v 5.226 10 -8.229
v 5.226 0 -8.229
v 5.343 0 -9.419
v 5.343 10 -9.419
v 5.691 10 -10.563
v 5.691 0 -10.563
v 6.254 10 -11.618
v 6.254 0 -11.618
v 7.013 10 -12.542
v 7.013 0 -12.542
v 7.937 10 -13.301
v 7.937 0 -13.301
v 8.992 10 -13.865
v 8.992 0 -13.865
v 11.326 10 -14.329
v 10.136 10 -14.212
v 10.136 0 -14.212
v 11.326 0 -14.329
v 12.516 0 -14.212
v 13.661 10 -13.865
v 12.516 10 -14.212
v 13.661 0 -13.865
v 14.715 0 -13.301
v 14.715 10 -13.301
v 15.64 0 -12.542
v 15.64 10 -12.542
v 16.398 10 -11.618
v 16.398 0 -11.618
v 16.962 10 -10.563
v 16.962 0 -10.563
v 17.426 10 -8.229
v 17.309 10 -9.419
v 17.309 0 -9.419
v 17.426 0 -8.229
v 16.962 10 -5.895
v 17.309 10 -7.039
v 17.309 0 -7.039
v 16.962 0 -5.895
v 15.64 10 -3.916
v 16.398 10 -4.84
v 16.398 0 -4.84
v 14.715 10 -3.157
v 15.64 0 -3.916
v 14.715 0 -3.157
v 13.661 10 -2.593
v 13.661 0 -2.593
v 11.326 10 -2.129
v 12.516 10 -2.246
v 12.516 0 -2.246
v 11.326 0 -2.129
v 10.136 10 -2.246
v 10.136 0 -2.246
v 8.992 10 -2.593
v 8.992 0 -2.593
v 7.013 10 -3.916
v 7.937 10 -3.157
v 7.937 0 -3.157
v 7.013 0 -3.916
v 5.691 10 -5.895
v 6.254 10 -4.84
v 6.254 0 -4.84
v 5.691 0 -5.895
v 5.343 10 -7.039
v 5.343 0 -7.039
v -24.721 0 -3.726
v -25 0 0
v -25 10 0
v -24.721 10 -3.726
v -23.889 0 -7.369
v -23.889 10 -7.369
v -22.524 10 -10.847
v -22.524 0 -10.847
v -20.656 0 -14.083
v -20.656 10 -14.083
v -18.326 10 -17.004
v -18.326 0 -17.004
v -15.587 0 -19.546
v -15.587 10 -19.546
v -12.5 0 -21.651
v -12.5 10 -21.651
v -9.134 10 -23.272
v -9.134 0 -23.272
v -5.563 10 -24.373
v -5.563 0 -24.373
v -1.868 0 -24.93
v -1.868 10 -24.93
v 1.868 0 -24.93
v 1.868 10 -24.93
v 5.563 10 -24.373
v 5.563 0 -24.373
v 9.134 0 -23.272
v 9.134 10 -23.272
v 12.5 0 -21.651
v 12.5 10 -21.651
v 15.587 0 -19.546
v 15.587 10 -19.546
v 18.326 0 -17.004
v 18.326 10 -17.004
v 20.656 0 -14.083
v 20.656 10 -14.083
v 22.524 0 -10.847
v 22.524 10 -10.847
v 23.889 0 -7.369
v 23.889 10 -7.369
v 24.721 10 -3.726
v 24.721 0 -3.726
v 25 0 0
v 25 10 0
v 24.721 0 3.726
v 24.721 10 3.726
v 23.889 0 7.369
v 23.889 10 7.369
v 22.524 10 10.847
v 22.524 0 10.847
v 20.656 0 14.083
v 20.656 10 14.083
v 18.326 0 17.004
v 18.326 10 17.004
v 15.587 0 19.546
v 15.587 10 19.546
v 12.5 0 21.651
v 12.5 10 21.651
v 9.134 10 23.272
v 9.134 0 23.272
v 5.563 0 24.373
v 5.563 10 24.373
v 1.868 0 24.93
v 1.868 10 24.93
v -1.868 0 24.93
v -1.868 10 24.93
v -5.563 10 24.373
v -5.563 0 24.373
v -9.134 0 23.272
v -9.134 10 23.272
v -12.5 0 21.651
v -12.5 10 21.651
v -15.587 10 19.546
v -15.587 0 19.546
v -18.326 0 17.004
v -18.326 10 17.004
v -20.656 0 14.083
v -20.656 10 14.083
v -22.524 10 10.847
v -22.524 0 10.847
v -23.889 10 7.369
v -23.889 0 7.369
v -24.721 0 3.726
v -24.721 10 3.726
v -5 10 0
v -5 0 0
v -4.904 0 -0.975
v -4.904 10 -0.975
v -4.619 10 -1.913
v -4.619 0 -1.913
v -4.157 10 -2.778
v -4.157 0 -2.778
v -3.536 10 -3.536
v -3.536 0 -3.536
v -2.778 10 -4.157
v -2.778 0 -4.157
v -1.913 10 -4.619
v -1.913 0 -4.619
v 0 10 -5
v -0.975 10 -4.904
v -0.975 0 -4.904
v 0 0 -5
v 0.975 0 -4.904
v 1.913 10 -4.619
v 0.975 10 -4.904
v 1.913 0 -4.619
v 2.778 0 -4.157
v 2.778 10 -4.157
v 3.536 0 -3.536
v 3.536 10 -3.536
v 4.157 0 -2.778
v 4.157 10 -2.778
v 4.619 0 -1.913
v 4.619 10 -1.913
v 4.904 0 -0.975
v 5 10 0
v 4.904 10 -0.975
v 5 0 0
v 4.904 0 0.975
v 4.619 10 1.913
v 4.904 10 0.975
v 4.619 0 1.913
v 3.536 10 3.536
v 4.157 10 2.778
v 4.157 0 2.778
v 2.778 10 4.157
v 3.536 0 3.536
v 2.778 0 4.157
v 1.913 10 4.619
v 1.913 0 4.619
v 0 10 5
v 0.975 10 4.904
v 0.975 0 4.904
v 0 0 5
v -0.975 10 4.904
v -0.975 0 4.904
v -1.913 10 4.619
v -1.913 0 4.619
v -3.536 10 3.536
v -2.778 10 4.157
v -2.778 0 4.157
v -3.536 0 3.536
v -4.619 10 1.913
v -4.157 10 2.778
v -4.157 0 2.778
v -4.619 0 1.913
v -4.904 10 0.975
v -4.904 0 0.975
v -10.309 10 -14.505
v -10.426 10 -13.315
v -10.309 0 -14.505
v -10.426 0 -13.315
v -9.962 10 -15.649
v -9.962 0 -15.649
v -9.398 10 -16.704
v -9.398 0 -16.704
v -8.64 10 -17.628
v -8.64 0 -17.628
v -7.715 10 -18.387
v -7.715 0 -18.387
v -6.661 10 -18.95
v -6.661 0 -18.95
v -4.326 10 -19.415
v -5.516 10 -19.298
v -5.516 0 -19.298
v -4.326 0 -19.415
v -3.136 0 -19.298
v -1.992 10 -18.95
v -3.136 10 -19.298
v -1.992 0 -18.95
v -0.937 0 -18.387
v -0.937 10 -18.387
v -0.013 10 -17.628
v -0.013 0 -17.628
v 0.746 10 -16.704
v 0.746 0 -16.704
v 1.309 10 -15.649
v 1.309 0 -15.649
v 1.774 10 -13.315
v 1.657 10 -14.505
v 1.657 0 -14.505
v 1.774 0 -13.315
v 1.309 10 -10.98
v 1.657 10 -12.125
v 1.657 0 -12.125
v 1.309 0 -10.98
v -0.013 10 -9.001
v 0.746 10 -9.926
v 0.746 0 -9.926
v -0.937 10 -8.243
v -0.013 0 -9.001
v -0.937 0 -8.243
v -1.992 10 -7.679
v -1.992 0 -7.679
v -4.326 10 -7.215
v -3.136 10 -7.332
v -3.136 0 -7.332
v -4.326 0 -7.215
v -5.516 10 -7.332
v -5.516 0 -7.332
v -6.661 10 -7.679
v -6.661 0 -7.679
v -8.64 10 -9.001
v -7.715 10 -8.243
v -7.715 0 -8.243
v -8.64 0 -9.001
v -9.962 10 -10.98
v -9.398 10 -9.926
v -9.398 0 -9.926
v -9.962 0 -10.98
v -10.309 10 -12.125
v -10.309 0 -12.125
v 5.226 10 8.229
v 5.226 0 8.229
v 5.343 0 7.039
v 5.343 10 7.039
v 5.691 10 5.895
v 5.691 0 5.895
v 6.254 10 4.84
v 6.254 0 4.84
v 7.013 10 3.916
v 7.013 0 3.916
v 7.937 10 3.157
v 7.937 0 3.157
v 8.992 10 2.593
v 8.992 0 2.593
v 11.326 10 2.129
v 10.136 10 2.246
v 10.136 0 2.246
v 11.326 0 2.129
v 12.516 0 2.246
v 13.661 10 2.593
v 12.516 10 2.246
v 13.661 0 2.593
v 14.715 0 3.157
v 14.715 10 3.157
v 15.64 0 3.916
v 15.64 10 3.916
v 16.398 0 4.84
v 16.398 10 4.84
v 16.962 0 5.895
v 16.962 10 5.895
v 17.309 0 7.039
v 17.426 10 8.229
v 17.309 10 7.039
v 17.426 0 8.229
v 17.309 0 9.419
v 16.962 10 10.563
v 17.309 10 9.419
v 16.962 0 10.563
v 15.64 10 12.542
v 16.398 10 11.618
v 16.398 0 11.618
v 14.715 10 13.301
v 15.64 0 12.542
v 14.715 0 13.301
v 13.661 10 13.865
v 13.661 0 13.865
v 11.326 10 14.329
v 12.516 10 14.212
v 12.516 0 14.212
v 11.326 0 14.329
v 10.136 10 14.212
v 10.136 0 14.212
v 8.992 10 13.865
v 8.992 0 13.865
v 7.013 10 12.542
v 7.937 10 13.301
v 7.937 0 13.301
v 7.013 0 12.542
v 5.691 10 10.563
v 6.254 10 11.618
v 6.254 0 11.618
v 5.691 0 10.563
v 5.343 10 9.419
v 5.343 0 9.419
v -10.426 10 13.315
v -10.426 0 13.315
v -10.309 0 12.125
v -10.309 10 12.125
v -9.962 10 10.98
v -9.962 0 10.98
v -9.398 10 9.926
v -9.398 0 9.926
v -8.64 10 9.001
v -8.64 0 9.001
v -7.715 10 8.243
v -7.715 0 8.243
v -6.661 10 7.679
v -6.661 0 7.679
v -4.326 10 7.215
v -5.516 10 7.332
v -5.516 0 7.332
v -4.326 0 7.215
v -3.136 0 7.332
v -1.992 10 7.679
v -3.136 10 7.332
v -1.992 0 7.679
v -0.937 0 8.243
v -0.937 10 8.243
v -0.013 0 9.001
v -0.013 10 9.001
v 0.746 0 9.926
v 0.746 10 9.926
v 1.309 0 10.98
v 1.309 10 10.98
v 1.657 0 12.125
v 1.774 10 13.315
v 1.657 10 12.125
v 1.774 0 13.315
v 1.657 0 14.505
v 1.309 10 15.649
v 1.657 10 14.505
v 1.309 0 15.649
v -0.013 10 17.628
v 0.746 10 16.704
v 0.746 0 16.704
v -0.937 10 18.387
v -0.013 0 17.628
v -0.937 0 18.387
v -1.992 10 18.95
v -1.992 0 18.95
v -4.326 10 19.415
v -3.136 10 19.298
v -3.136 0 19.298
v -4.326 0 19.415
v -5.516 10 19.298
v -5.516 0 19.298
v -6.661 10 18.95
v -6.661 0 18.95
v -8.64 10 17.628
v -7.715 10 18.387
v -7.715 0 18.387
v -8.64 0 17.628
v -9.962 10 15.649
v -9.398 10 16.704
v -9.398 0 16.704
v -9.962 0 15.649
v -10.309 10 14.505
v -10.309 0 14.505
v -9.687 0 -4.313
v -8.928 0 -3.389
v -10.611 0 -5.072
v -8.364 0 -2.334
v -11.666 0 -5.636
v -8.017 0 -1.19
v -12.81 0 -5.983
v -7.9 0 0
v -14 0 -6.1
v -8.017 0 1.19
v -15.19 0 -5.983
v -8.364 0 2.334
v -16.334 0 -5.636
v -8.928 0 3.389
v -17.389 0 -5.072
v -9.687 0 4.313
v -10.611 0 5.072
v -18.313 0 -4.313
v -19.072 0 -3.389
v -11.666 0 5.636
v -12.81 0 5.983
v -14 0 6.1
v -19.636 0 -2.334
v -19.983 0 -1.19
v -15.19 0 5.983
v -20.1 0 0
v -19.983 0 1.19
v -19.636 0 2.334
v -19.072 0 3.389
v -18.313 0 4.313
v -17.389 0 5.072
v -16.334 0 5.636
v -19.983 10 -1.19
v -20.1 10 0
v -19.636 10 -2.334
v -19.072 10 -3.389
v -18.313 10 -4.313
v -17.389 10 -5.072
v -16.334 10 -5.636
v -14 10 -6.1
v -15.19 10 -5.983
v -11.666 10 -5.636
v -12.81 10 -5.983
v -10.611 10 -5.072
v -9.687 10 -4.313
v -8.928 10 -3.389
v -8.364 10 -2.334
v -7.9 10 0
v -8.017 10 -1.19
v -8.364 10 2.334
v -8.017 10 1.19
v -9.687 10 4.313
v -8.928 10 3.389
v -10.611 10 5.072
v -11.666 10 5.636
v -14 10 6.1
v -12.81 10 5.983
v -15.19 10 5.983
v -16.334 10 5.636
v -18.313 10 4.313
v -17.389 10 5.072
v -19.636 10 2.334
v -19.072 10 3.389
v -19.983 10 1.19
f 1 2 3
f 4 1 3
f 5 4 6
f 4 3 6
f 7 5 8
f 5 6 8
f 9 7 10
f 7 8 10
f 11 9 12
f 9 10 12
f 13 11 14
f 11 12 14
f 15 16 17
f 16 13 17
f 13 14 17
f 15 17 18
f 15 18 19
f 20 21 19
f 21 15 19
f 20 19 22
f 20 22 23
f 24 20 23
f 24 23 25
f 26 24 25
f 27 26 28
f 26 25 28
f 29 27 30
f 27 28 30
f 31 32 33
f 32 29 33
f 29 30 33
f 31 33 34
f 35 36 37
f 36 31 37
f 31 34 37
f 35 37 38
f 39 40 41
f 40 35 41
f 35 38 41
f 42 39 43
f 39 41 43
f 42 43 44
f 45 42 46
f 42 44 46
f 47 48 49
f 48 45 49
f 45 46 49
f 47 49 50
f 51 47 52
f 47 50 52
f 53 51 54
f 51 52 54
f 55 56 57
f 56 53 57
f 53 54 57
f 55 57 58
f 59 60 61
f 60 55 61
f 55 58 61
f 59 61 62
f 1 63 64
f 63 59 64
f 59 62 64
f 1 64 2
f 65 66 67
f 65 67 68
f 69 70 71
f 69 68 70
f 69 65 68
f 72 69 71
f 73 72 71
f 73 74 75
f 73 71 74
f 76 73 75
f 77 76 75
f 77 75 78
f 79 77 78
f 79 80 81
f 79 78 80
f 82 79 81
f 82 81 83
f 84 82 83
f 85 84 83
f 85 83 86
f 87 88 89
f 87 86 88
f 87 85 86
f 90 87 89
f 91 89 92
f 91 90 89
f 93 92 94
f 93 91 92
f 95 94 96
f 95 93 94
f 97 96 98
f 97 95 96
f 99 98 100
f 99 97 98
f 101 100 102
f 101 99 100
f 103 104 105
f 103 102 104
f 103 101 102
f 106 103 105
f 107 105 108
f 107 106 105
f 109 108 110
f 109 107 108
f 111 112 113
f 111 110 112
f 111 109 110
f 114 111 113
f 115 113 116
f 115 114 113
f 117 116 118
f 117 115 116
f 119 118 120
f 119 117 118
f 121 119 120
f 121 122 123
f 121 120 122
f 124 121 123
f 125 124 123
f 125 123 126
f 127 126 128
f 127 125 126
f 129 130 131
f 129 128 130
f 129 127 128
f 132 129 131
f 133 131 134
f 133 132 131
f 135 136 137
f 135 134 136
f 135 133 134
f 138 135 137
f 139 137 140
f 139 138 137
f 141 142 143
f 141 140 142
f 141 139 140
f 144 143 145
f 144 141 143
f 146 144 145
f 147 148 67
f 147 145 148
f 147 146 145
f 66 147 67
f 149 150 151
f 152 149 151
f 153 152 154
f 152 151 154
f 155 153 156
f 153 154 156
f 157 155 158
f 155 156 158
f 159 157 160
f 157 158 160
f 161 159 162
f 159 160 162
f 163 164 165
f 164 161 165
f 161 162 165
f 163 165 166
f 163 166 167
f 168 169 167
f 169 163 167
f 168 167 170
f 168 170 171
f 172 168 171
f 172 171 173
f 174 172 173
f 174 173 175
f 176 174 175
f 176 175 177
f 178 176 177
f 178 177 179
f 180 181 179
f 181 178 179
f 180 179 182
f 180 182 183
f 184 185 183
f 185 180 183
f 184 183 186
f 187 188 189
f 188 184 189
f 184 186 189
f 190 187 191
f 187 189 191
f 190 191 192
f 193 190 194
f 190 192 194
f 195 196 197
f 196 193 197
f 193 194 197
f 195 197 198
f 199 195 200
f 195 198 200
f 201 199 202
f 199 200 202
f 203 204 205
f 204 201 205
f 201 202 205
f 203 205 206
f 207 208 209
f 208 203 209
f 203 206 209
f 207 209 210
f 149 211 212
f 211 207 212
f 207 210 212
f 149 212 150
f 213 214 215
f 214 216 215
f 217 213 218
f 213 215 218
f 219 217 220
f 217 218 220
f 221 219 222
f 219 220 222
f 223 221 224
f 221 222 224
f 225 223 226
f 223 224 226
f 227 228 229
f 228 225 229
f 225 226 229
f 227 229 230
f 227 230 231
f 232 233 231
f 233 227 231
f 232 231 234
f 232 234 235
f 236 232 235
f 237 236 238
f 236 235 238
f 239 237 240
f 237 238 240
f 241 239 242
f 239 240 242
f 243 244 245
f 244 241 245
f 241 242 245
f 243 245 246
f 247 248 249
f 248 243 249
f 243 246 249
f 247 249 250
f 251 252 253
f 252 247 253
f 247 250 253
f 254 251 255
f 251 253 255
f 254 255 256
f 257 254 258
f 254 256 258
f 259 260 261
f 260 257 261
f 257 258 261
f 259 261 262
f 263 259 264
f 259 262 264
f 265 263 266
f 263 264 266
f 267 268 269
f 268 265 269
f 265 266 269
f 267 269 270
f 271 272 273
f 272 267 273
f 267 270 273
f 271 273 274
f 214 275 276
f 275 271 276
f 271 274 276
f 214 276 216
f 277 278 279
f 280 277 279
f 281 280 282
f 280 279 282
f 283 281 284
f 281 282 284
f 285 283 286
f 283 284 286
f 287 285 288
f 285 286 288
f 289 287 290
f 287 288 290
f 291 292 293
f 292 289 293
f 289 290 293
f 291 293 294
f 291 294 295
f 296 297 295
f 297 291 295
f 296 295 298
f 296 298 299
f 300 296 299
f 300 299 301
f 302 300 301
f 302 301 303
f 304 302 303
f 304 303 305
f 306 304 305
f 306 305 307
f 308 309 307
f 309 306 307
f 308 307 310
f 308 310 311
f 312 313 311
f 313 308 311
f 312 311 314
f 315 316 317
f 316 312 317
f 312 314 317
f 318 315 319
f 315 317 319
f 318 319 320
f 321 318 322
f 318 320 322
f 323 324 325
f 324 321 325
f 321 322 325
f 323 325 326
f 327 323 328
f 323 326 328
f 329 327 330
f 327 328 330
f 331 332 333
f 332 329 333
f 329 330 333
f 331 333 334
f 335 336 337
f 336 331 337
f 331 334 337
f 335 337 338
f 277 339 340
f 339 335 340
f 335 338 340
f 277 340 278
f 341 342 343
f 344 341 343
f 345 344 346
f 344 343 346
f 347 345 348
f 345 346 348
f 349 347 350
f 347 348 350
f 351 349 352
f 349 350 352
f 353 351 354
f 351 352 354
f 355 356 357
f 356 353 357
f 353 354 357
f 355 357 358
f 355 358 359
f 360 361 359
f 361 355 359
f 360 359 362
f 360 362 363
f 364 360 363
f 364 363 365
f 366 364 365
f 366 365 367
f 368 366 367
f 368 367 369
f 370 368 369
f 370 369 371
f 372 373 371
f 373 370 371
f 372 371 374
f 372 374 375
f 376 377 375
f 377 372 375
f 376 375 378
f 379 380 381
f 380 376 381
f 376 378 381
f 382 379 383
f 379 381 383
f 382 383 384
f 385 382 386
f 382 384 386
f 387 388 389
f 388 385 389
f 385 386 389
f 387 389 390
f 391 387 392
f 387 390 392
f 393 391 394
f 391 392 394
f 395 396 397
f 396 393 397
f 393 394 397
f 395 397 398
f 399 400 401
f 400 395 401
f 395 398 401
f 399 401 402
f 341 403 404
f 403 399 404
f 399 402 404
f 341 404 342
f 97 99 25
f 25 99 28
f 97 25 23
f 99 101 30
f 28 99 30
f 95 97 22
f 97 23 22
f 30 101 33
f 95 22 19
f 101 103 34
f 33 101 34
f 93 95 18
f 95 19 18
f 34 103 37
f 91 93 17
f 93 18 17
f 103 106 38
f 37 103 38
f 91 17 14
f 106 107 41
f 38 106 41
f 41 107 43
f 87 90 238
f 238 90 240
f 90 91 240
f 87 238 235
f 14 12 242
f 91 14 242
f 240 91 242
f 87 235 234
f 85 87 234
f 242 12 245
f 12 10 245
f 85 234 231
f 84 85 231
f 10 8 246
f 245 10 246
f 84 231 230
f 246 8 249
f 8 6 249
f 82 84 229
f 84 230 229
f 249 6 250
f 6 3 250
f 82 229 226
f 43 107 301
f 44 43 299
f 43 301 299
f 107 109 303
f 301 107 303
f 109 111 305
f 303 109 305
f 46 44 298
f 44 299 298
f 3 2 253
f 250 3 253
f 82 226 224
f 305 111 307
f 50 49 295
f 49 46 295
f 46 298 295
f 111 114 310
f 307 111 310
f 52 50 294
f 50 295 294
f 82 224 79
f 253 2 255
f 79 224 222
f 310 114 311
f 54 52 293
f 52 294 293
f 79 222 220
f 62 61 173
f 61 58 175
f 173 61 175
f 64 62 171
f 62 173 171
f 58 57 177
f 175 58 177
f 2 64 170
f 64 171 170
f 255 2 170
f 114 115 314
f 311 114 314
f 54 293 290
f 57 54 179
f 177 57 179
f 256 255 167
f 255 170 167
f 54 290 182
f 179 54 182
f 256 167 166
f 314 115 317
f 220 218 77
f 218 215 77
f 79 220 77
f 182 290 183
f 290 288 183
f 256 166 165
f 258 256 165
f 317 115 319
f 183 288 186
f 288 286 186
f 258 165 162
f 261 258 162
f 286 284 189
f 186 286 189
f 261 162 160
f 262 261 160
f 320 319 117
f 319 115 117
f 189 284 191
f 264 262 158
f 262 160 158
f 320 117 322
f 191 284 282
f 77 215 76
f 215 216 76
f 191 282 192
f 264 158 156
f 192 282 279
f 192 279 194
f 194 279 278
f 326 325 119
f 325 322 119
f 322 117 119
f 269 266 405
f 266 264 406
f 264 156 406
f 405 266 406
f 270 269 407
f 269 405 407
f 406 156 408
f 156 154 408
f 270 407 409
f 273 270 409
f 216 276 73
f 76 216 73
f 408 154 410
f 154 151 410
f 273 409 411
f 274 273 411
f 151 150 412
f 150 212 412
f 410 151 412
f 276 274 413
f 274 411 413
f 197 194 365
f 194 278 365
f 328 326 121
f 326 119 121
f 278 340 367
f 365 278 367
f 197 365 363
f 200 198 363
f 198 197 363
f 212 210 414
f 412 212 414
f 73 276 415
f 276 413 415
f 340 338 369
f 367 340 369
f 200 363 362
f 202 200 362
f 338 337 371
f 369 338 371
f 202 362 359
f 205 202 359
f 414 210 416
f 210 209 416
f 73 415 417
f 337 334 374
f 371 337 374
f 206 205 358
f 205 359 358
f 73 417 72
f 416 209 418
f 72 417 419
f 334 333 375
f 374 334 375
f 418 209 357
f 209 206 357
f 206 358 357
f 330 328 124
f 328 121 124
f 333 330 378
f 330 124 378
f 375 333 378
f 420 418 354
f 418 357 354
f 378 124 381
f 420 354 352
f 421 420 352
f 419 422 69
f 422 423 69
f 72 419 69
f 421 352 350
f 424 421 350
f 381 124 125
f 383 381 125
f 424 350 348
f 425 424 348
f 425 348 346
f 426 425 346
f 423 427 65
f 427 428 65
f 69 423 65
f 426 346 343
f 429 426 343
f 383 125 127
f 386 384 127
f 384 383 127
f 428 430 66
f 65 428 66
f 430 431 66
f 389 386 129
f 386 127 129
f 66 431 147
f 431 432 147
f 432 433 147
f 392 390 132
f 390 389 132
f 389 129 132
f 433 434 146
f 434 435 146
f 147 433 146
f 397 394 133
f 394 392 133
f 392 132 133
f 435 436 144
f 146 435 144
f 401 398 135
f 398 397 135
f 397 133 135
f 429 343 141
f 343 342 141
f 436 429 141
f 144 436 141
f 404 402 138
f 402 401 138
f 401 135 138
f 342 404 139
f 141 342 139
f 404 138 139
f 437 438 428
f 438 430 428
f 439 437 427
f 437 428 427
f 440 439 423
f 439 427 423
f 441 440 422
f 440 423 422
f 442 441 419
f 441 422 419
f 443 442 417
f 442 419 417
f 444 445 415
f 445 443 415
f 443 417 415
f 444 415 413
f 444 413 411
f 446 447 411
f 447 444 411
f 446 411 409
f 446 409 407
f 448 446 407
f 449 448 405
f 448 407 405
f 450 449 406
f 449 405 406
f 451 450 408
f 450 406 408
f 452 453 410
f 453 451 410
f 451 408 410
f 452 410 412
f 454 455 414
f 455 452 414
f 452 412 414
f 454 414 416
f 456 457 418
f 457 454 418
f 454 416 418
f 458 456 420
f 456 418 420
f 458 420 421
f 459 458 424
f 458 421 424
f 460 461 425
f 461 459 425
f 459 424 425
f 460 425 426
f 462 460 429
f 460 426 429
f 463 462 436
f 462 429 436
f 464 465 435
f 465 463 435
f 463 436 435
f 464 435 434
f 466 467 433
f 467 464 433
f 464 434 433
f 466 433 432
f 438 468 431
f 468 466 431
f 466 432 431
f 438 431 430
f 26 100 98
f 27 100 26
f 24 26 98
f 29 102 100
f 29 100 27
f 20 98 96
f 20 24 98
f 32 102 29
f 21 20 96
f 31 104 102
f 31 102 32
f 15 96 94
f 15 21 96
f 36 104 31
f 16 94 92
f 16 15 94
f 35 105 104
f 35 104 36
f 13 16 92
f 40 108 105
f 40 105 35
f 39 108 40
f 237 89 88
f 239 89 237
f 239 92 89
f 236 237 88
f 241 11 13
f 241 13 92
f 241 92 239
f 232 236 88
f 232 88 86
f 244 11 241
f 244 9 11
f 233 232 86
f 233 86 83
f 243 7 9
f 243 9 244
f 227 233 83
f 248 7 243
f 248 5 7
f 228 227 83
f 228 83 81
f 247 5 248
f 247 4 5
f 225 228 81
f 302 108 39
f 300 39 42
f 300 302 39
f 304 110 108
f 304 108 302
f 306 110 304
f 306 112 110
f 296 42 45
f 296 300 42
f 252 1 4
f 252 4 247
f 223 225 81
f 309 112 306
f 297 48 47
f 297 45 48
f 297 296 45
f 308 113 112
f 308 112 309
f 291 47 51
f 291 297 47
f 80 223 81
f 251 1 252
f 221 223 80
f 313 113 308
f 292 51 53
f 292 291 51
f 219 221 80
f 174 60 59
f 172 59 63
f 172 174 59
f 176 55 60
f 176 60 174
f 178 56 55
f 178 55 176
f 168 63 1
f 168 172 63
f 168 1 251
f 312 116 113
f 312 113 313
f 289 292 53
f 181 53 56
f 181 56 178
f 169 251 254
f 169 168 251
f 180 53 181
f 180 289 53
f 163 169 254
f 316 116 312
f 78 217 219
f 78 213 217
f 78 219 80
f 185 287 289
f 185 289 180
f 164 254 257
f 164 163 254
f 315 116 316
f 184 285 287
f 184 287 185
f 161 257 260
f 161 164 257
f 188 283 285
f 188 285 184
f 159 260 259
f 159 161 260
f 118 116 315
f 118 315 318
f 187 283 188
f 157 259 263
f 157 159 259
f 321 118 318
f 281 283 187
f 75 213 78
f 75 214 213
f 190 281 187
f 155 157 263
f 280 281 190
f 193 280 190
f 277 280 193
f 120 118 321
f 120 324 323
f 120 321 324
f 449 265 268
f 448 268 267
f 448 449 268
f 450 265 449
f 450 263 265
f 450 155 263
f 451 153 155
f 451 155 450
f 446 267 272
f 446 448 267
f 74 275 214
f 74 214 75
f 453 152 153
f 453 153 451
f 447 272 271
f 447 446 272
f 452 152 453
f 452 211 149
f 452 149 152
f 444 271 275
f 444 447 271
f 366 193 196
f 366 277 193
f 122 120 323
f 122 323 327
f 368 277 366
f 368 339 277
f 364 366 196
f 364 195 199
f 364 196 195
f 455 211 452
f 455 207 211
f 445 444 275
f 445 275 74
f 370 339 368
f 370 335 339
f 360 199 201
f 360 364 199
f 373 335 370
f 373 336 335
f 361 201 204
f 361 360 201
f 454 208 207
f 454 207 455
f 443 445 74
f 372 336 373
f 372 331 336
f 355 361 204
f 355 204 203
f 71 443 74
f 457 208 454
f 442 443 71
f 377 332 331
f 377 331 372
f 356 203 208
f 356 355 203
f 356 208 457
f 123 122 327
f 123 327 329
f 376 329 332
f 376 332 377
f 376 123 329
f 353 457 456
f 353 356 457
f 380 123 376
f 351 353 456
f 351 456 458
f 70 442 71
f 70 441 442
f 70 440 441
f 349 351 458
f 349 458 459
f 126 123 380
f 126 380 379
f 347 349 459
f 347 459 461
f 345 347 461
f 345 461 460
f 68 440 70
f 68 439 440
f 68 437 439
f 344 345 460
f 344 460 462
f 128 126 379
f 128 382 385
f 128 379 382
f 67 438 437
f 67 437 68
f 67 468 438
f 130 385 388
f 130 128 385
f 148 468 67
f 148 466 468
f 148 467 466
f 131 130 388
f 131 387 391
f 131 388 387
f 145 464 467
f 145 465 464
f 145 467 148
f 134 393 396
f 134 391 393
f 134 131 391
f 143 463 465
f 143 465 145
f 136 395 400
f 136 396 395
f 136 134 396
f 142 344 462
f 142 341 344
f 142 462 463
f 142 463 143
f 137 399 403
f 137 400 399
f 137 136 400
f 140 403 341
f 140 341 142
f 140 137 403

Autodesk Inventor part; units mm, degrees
ref_plane "YZ Plane" through (0, 0, 0) normal (1, 0, 0) x (0, 1, 0)
ref_plane "XZ Plane" through (0, 0, 0) normal (0, 1, 0) x (-1, 0, 0)
ref_plane "XY Plane" through (0, 0, 0) normal (0, 0, 1) x (1, 0, 0)
sketch "Эскиз1" plane through (0, 0, 0) normal (0, 1, 0) x (-1, 0, 0)
  circle A0 centre (0, 0) radius 5
  circle A1 centre (0, 0) radius 25
  circle A2 centre (14, 0) radius 6.1
  circle A3 centre (4.3262, 13.3148) radius 6.1
  circle A4 centre (-11.3262, 8.229) radius 6.1
  circle A5 centre (-11.3262, -8.229) radius 6.1
  circle A6 centre (4.3262, -13.3148) radius 6.1
  dimension "d2" = 10
  dimension "d3" = 50
  dimension "d4" = 12.2
  dimension "d5" = 14
  dimension "d6" = 360
extrude "Выдавливание1" add sketch "Эскиз1" along normal blind 10
properties part number "ротор редуктора"
